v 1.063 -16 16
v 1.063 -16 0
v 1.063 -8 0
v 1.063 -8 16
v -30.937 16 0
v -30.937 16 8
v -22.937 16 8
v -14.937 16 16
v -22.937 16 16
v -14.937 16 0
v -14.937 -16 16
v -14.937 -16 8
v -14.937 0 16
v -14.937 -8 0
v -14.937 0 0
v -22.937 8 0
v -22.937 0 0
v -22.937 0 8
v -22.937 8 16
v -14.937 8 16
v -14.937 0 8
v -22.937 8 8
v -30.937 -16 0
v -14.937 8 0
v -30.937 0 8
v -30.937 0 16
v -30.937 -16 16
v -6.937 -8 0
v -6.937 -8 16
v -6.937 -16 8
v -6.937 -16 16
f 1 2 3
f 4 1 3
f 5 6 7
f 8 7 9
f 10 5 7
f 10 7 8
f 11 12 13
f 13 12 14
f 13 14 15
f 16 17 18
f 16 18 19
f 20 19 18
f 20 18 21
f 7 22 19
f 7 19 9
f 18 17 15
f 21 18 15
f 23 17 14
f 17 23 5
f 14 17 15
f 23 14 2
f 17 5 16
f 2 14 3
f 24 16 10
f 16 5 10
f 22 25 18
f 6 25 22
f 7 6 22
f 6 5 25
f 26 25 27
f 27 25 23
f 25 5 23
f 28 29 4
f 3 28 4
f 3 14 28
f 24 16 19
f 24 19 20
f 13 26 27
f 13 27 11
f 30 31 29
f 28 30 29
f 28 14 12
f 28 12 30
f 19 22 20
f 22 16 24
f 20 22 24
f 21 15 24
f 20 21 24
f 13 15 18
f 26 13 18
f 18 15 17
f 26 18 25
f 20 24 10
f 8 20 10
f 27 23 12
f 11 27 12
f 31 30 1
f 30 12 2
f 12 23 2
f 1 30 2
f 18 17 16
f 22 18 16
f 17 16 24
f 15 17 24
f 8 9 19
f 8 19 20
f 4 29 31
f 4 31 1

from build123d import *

# Parameters (mm, degrees)
F0_W     = 8
F0_H     = 8
F1_DEPTH = 16
F2_DEPTH = 8
F3_DEPTH = 16
F4_DEPTH = 8
F5_DEPTH = 16
F6_DEPTH = 16
F7_SIZE  = 7.99999
F8_SIZE  = 7.99999


# Not quite as in the source:
# - a fillet or chamfer is up to 0.001 mm smaller than in the source, because OpenCascade refuses the exact size


with BuildPart() as f1:
    # F0 (on Top) → F1 (new body)
    with BuildSketch(Plane.XY):
        with Locations((-2.9367977926, -12)):
            Rectangle(F0_W, F0_H)
    extrude(amount=F1_DEPTH)

    # F0 (on Top) → F2 (join)
    with BuildSketch(Plane.XY):
        with Locations((-10.9367977926, -12)):
            Rectangle(F0_W, F0_H)
    extrude(amount=F2_DEPTH)

    # F0 (on Top) → F3 (join)
    with BuildSketch(Plane.XY):
        Polygon((-22.9367977926, 0), (-30.9367977926, 0), (-30.9367977926, -16), (-14.9367977926, -16), (-14.9367977926, -8), (-14.9367977926, 0), align=None)
    extrude(amount=F3_DEPTH)

    # F0 (on Top) → F4 (join)
    with BuildSketch(Plane.XY):
        Polygon((-22.9367977926, 16), (-30.9367977926, 16), (-30.9367977926, 0), (-22.9367977926, 0), (-22.9367977926, 8), align=None)
    extrude(amount=F4_DEPTH)

    # F0 (on Top) → F5 (join)
    with BuildSketch(Plane.XY):
        with Locations((-18.9367977926, 12)):
            Rectangle(F0_W, F0_H)
    extrude(amount=F5_DEPTH)

    # F7 (size 8 in the source; OpenCascade refuses exactly that, so slightly less here)
    f7_edges = [f1.edges().sort_by_distance(p)[0] for p in [
        (-10.936798, -8, 8),
    ]]
    chamfer(f7_edges, length=F7_SIZE)


with BuildPart() as f6:
    # F0 (on Top) → F6 (new body)
    with BuildSketch(Plane.XY):
        with Locations((-18.9367977926, 4)):
            Rectangle(F0_W, F0_H)
    extrude(amount=F6_DEPTH)

    # F8 (size 8 in the source; OpenCascade refuses exactly that, so slightly less here)
    f8_edges = [f6.edges().sort_by_distance(p)[0] for p in [
        (-18.936798, 0, 16),
    ]]
    chamfer(f8_edges, length=F8_SIZE)


solid = Compound([f1.part, f6.part])
